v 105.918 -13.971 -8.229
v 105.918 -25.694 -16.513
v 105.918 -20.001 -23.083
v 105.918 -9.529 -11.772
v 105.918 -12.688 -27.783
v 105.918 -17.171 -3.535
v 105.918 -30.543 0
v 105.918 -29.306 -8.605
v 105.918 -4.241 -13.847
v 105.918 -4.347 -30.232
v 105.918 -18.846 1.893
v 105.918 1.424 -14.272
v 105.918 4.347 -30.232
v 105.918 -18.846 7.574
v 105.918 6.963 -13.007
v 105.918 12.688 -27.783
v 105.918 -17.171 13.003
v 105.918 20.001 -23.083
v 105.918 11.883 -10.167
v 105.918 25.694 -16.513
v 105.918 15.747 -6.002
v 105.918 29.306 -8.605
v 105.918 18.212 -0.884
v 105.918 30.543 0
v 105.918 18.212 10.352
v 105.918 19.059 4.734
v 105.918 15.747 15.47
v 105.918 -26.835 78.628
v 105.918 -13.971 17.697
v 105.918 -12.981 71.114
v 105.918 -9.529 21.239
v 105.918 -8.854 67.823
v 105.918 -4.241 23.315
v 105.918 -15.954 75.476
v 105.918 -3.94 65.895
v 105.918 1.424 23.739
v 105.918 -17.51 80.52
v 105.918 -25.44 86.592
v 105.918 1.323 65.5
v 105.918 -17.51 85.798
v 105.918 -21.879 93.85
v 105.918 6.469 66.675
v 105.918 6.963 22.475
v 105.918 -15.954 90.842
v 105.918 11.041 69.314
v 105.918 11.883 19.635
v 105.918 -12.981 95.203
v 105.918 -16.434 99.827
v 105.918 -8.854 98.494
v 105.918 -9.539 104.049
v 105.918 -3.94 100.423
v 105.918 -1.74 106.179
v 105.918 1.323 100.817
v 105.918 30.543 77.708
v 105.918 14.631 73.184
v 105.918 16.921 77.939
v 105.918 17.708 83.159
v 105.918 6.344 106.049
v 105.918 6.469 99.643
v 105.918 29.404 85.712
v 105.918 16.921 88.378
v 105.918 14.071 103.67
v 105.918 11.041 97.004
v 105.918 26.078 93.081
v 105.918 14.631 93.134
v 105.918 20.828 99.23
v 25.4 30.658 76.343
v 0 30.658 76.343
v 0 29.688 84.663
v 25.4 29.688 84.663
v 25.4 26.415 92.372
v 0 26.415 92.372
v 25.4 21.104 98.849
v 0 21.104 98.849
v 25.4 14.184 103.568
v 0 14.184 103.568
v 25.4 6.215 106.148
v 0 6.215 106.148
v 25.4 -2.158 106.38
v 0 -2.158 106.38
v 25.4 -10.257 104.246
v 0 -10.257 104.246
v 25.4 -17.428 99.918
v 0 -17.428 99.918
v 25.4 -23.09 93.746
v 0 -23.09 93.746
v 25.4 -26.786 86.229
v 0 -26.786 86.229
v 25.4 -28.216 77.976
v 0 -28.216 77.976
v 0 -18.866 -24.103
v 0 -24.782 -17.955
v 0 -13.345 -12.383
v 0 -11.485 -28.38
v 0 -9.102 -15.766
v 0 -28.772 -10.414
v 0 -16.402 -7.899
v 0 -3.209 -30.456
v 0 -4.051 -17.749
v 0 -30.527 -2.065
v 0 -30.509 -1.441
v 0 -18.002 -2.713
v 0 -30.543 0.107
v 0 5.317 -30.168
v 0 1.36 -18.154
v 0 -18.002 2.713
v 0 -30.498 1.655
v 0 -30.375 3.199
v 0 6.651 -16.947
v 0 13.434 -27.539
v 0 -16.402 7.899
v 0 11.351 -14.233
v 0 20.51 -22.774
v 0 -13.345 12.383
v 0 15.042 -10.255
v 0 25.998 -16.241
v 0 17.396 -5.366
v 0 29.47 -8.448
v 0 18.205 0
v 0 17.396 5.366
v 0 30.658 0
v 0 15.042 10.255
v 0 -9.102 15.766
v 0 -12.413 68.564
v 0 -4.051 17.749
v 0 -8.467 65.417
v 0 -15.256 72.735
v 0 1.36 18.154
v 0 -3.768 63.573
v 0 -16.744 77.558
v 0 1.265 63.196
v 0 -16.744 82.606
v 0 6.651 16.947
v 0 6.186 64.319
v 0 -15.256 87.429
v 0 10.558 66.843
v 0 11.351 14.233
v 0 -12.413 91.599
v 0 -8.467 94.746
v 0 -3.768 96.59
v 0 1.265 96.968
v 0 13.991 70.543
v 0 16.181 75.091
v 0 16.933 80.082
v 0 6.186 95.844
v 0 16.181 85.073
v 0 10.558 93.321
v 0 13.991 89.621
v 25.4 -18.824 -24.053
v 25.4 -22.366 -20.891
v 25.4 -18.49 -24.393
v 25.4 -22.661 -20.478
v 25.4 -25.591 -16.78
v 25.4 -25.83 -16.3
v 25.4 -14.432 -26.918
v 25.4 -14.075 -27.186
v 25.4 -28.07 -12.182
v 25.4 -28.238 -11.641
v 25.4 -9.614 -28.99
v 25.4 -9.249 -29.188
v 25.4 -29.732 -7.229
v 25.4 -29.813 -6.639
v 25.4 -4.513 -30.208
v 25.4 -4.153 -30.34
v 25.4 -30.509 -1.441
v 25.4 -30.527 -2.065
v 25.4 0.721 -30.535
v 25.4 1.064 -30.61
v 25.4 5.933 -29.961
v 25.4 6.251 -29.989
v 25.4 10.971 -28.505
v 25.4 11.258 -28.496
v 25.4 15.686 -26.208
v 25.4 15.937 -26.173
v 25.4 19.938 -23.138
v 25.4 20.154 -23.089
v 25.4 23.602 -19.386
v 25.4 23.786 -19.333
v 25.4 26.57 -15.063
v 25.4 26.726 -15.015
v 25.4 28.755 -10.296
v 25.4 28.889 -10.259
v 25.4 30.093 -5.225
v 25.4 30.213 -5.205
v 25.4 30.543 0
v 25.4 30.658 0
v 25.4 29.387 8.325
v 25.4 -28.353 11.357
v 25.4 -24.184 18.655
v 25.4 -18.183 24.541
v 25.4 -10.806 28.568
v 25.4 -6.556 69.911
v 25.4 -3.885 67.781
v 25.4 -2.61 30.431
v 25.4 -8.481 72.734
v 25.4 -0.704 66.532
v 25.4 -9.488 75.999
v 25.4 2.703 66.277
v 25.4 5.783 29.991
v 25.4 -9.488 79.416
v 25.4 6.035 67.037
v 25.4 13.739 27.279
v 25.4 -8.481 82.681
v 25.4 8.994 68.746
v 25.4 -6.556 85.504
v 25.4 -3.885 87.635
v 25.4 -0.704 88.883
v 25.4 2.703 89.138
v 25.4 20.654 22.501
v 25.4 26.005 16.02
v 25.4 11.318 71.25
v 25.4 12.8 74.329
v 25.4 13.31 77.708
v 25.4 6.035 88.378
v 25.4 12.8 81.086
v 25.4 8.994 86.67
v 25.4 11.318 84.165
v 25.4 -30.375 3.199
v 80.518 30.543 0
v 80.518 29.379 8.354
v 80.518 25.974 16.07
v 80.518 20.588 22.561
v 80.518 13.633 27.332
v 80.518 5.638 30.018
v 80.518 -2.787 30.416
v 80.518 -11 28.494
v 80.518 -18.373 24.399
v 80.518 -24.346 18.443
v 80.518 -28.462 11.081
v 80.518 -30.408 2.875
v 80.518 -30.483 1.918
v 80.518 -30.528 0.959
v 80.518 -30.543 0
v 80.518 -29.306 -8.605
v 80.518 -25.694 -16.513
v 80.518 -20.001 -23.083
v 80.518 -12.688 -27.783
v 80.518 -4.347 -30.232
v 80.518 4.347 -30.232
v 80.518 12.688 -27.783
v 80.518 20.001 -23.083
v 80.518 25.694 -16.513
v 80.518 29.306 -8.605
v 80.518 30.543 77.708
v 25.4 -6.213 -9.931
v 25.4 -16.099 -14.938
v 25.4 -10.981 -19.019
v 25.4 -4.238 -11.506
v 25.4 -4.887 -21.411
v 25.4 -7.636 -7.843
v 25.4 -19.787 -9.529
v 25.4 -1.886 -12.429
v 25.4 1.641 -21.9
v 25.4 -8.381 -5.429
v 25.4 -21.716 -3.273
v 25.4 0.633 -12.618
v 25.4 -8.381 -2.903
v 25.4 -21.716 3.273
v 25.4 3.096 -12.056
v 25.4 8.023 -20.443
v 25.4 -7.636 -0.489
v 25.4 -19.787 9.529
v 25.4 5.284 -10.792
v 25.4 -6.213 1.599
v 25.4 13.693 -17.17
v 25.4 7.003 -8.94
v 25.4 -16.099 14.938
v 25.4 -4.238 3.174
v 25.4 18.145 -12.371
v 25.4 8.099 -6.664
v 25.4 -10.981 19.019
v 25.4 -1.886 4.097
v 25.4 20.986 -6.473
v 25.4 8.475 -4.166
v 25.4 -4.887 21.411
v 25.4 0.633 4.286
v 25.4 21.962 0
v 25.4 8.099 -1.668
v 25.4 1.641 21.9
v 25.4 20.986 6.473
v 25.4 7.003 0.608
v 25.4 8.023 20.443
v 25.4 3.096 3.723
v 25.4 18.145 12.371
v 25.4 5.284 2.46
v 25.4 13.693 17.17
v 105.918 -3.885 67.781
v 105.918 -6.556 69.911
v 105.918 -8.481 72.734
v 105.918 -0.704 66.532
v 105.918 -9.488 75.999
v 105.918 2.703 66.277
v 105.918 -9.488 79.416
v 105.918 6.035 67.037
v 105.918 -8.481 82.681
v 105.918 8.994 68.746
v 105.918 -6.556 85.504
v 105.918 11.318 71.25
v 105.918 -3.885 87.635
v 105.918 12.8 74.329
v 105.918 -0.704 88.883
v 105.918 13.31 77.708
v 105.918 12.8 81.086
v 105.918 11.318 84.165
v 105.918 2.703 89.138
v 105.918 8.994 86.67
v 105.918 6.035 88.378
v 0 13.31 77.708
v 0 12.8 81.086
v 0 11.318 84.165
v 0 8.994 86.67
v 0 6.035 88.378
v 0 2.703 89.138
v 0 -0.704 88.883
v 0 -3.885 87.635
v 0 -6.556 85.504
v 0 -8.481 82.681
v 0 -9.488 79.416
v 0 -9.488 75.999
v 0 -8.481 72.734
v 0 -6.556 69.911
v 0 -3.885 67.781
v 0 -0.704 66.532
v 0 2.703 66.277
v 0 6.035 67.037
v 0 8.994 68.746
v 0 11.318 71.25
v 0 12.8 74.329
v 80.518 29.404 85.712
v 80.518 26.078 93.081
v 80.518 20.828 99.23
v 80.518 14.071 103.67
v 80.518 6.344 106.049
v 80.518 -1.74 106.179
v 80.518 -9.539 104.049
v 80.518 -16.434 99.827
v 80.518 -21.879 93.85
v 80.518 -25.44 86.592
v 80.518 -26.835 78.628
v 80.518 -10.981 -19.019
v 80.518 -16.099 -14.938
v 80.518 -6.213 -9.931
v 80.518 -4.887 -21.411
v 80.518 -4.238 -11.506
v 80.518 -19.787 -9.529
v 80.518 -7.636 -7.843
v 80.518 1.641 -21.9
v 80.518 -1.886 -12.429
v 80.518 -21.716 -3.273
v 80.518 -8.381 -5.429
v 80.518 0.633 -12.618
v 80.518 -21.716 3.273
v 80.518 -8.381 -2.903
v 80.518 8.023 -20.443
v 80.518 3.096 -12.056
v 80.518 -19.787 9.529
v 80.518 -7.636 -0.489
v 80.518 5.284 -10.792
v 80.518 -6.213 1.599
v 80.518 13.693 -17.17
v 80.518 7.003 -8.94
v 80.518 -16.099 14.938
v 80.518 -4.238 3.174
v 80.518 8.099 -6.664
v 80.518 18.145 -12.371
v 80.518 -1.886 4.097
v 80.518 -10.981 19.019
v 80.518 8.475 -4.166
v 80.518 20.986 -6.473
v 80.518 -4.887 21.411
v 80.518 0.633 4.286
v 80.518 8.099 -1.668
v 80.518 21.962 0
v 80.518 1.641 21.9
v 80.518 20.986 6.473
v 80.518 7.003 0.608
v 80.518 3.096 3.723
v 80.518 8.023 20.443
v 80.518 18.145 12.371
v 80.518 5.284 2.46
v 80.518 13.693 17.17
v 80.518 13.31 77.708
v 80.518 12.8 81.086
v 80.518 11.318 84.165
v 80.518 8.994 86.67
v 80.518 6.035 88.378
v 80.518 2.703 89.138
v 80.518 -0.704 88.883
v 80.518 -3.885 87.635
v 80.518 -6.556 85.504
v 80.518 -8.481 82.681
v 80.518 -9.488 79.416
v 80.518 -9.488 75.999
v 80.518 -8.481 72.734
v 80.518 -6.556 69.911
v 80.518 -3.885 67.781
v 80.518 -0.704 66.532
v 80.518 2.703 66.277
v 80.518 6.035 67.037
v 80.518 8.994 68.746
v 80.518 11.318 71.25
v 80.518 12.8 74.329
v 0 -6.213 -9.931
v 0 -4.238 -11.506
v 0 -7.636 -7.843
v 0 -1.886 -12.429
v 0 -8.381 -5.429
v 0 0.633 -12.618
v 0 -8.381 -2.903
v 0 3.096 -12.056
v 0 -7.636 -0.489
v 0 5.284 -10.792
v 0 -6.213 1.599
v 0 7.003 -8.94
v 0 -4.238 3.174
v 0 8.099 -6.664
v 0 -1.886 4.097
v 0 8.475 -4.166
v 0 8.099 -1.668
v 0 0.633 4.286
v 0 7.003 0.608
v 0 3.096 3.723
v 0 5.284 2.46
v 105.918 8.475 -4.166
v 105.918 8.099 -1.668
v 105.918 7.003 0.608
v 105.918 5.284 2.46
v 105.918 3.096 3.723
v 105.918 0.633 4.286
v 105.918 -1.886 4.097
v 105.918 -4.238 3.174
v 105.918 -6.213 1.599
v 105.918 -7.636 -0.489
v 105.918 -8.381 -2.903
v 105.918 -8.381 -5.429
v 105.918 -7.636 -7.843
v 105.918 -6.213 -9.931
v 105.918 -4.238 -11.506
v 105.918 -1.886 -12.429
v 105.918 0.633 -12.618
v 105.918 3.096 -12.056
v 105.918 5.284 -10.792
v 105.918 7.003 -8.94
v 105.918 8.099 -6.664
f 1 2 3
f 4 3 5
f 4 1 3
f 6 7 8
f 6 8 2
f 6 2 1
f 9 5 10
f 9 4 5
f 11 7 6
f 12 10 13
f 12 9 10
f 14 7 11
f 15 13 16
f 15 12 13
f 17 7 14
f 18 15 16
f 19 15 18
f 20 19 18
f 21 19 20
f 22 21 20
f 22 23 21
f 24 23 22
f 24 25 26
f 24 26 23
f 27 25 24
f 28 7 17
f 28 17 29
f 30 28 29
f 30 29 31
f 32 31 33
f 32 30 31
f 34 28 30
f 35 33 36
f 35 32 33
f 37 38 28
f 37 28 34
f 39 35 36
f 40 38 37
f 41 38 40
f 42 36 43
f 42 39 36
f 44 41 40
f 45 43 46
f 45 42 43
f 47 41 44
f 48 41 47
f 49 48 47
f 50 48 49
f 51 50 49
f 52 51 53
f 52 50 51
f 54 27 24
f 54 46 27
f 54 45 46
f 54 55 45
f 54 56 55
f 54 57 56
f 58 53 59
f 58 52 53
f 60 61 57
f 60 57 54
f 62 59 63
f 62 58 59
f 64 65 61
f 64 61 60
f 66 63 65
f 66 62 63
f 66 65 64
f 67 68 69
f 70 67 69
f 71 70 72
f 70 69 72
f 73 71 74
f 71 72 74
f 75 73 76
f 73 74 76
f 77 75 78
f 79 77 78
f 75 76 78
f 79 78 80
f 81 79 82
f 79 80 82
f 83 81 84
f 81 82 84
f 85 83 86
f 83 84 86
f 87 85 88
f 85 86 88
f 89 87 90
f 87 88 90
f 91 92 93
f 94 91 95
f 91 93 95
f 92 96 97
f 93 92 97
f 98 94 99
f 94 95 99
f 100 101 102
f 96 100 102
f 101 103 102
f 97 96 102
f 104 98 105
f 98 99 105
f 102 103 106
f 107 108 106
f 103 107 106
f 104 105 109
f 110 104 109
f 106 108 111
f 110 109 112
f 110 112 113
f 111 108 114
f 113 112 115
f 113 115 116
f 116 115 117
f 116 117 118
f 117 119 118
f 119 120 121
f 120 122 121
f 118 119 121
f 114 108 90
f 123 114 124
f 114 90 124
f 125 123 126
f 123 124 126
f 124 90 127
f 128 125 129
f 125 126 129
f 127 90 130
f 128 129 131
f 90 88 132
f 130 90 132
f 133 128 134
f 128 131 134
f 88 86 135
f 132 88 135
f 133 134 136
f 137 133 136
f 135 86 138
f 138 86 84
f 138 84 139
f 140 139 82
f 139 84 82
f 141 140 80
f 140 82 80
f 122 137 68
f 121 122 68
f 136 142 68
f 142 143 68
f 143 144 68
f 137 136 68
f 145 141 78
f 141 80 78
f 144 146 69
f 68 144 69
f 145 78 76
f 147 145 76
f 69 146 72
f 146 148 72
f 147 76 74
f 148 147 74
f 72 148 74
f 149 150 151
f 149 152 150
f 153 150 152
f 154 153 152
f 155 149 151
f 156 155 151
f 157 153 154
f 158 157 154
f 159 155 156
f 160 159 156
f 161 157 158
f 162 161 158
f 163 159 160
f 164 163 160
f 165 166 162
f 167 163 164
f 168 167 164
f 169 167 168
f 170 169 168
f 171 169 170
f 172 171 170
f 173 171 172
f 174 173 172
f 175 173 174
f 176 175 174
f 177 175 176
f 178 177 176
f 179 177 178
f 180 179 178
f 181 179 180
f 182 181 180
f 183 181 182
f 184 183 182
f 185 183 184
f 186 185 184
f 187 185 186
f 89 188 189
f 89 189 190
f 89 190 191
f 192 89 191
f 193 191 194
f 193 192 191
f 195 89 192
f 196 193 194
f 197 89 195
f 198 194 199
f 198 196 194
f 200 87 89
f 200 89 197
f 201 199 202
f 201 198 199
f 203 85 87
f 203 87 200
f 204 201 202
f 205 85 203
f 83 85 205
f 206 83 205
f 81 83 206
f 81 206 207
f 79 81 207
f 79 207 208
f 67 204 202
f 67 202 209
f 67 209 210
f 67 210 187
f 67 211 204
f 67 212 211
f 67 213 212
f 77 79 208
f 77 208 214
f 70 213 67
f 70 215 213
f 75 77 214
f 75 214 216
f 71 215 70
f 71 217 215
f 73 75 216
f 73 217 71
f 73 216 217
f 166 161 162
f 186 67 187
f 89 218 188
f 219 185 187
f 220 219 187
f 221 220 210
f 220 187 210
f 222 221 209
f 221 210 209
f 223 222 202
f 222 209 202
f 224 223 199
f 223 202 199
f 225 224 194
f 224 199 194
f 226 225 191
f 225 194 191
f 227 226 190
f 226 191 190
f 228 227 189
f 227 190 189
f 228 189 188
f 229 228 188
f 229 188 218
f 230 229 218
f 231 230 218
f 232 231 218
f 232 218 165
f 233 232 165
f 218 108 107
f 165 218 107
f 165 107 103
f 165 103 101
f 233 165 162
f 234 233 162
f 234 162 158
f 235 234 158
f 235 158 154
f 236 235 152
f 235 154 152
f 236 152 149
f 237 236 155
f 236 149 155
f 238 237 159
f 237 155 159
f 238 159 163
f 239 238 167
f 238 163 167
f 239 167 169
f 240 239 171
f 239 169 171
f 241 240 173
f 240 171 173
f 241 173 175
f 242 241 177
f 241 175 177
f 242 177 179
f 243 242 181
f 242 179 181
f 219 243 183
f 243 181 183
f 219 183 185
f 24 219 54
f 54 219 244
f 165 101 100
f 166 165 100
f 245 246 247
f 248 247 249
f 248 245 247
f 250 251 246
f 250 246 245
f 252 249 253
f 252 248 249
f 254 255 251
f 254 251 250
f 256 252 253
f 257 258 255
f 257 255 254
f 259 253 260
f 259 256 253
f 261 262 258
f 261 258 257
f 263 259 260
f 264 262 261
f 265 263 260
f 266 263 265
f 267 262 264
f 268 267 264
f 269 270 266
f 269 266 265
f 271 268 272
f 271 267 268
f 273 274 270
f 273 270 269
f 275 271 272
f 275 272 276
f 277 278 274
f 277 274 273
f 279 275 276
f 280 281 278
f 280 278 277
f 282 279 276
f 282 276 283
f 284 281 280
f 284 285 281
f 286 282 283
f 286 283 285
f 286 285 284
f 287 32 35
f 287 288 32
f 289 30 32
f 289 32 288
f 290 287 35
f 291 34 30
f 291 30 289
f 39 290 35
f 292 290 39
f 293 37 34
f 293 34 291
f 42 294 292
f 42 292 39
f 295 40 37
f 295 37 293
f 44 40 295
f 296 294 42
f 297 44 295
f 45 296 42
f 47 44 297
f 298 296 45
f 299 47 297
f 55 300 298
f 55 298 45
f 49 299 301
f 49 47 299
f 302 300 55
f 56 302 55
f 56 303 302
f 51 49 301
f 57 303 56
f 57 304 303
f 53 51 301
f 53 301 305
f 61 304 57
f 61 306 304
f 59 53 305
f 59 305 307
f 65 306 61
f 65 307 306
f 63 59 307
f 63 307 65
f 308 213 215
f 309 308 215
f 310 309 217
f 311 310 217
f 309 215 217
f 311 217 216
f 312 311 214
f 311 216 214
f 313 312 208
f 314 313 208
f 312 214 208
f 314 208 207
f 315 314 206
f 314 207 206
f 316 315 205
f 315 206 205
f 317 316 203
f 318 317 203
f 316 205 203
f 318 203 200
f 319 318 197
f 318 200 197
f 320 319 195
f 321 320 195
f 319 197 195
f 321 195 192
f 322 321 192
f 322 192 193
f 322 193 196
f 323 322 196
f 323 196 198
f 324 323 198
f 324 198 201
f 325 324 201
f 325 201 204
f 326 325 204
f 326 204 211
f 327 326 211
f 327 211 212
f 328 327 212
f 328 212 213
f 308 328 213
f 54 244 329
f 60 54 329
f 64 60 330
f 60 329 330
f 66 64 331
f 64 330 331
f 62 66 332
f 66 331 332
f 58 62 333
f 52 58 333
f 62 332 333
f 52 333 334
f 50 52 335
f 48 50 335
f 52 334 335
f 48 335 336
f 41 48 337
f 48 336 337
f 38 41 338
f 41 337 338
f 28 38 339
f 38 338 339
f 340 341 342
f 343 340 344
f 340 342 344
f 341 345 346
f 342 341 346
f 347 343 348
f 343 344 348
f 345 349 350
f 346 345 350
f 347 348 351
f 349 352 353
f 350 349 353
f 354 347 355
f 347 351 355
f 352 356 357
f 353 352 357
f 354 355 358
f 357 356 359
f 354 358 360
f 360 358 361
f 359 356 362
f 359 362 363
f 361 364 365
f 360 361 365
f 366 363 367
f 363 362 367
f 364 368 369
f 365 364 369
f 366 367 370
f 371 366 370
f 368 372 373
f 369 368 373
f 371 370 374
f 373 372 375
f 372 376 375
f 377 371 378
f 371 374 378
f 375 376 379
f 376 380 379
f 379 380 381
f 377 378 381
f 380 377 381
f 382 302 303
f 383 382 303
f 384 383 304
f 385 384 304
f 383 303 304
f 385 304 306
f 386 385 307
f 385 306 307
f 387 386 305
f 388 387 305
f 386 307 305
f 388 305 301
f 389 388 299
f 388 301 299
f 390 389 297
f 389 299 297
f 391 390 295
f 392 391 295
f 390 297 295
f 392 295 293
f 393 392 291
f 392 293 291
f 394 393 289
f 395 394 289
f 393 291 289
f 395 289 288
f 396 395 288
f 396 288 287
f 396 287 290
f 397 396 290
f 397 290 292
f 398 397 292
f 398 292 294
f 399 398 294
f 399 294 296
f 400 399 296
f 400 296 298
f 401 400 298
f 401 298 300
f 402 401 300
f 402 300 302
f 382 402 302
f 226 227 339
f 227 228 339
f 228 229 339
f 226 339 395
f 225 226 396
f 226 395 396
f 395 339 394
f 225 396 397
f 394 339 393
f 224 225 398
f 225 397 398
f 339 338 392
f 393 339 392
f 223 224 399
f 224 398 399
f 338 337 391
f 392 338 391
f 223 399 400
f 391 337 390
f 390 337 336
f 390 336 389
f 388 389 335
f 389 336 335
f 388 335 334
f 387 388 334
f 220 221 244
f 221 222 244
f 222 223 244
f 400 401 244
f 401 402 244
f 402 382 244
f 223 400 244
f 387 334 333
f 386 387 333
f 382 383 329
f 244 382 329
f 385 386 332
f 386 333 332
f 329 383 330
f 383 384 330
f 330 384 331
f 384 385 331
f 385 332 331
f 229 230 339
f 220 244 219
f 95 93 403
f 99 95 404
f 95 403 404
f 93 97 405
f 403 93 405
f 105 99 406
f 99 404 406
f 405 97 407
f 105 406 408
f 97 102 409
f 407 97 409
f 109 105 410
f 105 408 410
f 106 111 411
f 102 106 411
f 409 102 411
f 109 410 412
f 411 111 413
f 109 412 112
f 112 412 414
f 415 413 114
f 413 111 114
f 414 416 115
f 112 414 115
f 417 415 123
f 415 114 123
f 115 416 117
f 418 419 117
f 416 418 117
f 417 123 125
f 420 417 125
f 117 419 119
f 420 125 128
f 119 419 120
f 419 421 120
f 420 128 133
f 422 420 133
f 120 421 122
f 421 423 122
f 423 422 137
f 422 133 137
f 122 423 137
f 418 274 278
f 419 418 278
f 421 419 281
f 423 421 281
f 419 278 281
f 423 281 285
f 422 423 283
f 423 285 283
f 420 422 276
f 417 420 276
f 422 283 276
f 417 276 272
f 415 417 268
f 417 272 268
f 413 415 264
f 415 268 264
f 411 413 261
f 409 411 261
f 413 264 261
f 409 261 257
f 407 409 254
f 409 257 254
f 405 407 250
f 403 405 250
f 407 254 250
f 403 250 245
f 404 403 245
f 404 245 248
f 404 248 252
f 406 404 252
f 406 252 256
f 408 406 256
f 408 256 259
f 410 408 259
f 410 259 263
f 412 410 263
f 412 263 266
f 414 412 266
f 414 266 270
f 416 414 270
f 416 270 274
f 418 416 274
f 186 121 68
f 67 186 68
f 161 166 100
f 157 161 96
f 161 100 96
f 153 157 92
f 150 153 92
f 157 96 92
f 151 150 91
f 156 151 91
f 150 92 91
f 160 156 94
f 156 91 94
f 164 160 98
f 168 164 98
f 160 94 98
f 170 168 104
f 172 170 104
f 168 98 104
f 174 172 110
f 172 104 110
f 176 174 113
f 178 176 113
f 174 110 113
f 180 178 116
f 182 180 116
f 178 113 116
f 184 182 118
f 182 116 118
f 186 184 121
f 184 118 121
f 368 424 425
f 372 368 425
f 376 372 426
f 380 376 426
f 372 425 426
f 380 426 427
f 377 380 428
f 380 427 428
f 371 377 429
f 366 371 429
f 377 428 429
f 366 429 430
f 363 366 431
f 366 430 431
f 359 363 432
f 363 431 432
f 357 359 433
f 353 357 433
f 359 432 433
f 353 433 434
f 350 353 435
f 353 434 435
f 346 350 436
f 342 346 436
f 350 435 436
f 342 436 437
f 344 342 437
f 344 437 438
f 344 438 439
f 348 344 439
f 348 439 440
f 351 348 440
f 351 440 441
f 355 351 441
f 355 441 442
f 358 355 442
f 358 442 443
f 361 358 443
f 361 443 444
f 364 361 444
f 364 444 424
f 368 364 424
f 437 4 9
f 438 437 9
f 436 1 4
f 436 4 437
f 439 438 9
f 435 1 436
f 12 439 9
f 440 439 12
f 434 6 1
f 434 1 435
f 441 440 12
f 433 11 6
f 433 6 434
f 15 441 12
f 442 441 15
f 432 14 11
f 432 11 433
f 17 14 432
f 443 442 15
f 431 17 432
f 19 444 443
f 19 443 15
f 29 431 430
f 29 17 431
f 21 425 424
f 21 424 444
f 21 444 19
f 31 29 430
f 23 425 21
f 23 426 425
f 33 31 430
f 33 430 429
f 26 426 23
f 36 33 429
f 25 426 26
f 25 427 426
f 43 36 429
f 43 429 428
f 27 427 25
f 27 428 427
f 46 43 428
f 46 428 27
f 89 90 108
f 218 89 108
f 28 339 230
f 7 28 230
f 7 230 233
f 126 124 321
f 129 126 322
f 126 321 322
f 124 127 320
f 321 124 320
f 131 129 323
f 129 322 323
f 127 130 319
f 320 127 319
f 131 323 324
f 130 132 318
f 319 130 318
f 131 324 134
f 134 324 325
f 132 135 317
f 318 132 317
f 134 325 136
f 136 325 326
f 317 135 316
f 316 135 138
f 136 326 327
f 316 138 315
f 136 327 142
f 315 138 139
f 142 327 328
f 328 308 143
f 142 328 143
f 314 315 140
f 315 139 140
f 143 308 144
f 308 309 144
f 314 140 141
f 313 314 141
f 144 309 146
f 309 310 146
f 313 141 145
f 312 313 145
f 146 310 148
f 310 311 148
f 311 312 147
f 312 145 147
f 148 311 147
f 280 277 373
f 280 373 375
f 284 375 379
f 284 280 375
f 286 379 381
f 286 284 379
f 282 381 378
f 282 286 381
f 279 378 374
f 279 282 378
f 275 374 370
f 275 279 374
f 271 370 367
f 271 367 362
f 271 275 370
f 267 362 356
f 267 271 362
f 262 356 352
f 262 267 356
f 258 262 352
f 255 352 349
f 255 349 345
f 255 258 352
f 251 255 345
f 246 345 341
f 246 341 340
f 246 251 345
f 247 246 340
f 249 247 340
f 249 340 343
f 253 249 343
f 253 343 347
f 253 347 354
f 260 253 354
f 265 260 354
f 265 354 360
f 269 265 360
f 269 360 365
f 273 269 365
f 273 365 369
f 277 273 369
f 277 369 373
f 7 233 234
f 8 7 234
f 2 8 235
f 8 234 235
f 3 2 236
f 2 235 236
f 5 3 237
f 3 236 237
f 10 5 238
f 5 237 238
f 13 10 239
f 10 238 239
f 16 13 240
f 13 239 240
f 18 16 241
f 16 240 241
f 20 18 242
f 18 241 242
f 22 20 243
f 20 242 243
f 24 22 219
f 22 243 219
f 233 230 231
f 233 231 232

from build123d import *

# Parameters (mm, degrees)
F0_R      = 30.5430762162
F0_R_2    = 21.9615472454
F1_DEPTH  = 80.518
F3_DEPTH  = 25.4
F5_DEPTH  = 25.4
F6_R      = 18.2049933001
F6_R_2    = 16.9331377315
F7_DEPTH  = 24.384
F8_R      = 17.7079617299
F8_R_2    = 19.0588053324
F9_DEPTH  = 24.638
F10_R     = 11.4627485179
F11_DEPTH = 317.246
F12_R     = 8.4753659895
F13_DEPTH = 402.082


# Not quite as in the source:
# - a feature names something its author has since deleted; it is built from what else it names


with BuildPart() as f1:
    # F0 (on Right) → F1 (new body)
    with BuildSketch(Plane.YZ):
        Circle(F0_R)
        Circle(F0_R_2, mode=Mode.SUBTRACT)
    extrude(amount=F1_DEPTH)

    # F2 (on Right) → F3 (join)
    with BuildSketch(Plane.YZ):
        with BuildLine():
            ThreePointArc((-30.5271036923, -2.0653288811), (1.0640567768, -30.6101895865), (30.6584276259, 0))
            Line((30.6584276259, 0), (30.6584276259, 76.3430893421))
            ThreePointArc((30.6584276259, 76.3430893421), (2.0369783495, 106.5633685136), (-28.2157845795, 77.976256609))
            Line((-28.2157845795, 77.976256609), (-30.5271036923, -2.0653288811))
        make_face()
    extrude(amount=F3_DEPTH)

    # F4 (on face) → F5 (join)
    with BuildSketch(Plane.YZ.offset(80.518)):
        with BuildLine():
            Line((-26.8347635865, 78.6278471351), (-30.5430762162, 0))
            ThreePointArc((-30.5430762162, 0), (0, -30.5430762162), (30.5430762162, 0))
            Line((30.5430762162, 0), (30.5430762162, 77.7075961232))
            ThreePointArc((30.5430762162, 77.7075961232), (2.3069613013, 106.4002056349), (-26.8347635865, 78.6278471351))
        make_face()
    extrude(amount=F5_DEPTH)

    # F6 (on Right) → F7 (join)
    with BuildSketch(Plane.YZ):
        Circle(F6_R)
        with Locations((0, 80.0817832351)):
            Circle(F6_R_2)
    extrude(amount=F7_DEPTH)

    # F8 (on face) → F9 (join)
    with BuildSketch(Plane.YZ.offset(105.918)):
        with Locations((0, 83.1589326262)):
            Circle(F8_R)
        with Locations((0, 4.7338949516)):
            Circle(F8_R_2)
    extrude(amount=-F9_DEPTH)

    # F10 (on face) → F11 (cut)
    with BuildSketch(Plane.YZ.offset(105.918)):
        with Locations((1.8467766198, 77.7075961232)):
            Circle(F10_R)
    extrude(amount=-F11_DEPTH, mode=Mode.SUBTRACT)

    # F12 (on face) → F13 (cut)
    with BuildSketch(Plane.YZ.offset(105.918)):
        with Locations((0, -4.1660955176)):
            Circle(F12_R)
    extrude(amount=-F13_DEPTH, mode=Mode.SUBTRACT)


solid = f1.part
